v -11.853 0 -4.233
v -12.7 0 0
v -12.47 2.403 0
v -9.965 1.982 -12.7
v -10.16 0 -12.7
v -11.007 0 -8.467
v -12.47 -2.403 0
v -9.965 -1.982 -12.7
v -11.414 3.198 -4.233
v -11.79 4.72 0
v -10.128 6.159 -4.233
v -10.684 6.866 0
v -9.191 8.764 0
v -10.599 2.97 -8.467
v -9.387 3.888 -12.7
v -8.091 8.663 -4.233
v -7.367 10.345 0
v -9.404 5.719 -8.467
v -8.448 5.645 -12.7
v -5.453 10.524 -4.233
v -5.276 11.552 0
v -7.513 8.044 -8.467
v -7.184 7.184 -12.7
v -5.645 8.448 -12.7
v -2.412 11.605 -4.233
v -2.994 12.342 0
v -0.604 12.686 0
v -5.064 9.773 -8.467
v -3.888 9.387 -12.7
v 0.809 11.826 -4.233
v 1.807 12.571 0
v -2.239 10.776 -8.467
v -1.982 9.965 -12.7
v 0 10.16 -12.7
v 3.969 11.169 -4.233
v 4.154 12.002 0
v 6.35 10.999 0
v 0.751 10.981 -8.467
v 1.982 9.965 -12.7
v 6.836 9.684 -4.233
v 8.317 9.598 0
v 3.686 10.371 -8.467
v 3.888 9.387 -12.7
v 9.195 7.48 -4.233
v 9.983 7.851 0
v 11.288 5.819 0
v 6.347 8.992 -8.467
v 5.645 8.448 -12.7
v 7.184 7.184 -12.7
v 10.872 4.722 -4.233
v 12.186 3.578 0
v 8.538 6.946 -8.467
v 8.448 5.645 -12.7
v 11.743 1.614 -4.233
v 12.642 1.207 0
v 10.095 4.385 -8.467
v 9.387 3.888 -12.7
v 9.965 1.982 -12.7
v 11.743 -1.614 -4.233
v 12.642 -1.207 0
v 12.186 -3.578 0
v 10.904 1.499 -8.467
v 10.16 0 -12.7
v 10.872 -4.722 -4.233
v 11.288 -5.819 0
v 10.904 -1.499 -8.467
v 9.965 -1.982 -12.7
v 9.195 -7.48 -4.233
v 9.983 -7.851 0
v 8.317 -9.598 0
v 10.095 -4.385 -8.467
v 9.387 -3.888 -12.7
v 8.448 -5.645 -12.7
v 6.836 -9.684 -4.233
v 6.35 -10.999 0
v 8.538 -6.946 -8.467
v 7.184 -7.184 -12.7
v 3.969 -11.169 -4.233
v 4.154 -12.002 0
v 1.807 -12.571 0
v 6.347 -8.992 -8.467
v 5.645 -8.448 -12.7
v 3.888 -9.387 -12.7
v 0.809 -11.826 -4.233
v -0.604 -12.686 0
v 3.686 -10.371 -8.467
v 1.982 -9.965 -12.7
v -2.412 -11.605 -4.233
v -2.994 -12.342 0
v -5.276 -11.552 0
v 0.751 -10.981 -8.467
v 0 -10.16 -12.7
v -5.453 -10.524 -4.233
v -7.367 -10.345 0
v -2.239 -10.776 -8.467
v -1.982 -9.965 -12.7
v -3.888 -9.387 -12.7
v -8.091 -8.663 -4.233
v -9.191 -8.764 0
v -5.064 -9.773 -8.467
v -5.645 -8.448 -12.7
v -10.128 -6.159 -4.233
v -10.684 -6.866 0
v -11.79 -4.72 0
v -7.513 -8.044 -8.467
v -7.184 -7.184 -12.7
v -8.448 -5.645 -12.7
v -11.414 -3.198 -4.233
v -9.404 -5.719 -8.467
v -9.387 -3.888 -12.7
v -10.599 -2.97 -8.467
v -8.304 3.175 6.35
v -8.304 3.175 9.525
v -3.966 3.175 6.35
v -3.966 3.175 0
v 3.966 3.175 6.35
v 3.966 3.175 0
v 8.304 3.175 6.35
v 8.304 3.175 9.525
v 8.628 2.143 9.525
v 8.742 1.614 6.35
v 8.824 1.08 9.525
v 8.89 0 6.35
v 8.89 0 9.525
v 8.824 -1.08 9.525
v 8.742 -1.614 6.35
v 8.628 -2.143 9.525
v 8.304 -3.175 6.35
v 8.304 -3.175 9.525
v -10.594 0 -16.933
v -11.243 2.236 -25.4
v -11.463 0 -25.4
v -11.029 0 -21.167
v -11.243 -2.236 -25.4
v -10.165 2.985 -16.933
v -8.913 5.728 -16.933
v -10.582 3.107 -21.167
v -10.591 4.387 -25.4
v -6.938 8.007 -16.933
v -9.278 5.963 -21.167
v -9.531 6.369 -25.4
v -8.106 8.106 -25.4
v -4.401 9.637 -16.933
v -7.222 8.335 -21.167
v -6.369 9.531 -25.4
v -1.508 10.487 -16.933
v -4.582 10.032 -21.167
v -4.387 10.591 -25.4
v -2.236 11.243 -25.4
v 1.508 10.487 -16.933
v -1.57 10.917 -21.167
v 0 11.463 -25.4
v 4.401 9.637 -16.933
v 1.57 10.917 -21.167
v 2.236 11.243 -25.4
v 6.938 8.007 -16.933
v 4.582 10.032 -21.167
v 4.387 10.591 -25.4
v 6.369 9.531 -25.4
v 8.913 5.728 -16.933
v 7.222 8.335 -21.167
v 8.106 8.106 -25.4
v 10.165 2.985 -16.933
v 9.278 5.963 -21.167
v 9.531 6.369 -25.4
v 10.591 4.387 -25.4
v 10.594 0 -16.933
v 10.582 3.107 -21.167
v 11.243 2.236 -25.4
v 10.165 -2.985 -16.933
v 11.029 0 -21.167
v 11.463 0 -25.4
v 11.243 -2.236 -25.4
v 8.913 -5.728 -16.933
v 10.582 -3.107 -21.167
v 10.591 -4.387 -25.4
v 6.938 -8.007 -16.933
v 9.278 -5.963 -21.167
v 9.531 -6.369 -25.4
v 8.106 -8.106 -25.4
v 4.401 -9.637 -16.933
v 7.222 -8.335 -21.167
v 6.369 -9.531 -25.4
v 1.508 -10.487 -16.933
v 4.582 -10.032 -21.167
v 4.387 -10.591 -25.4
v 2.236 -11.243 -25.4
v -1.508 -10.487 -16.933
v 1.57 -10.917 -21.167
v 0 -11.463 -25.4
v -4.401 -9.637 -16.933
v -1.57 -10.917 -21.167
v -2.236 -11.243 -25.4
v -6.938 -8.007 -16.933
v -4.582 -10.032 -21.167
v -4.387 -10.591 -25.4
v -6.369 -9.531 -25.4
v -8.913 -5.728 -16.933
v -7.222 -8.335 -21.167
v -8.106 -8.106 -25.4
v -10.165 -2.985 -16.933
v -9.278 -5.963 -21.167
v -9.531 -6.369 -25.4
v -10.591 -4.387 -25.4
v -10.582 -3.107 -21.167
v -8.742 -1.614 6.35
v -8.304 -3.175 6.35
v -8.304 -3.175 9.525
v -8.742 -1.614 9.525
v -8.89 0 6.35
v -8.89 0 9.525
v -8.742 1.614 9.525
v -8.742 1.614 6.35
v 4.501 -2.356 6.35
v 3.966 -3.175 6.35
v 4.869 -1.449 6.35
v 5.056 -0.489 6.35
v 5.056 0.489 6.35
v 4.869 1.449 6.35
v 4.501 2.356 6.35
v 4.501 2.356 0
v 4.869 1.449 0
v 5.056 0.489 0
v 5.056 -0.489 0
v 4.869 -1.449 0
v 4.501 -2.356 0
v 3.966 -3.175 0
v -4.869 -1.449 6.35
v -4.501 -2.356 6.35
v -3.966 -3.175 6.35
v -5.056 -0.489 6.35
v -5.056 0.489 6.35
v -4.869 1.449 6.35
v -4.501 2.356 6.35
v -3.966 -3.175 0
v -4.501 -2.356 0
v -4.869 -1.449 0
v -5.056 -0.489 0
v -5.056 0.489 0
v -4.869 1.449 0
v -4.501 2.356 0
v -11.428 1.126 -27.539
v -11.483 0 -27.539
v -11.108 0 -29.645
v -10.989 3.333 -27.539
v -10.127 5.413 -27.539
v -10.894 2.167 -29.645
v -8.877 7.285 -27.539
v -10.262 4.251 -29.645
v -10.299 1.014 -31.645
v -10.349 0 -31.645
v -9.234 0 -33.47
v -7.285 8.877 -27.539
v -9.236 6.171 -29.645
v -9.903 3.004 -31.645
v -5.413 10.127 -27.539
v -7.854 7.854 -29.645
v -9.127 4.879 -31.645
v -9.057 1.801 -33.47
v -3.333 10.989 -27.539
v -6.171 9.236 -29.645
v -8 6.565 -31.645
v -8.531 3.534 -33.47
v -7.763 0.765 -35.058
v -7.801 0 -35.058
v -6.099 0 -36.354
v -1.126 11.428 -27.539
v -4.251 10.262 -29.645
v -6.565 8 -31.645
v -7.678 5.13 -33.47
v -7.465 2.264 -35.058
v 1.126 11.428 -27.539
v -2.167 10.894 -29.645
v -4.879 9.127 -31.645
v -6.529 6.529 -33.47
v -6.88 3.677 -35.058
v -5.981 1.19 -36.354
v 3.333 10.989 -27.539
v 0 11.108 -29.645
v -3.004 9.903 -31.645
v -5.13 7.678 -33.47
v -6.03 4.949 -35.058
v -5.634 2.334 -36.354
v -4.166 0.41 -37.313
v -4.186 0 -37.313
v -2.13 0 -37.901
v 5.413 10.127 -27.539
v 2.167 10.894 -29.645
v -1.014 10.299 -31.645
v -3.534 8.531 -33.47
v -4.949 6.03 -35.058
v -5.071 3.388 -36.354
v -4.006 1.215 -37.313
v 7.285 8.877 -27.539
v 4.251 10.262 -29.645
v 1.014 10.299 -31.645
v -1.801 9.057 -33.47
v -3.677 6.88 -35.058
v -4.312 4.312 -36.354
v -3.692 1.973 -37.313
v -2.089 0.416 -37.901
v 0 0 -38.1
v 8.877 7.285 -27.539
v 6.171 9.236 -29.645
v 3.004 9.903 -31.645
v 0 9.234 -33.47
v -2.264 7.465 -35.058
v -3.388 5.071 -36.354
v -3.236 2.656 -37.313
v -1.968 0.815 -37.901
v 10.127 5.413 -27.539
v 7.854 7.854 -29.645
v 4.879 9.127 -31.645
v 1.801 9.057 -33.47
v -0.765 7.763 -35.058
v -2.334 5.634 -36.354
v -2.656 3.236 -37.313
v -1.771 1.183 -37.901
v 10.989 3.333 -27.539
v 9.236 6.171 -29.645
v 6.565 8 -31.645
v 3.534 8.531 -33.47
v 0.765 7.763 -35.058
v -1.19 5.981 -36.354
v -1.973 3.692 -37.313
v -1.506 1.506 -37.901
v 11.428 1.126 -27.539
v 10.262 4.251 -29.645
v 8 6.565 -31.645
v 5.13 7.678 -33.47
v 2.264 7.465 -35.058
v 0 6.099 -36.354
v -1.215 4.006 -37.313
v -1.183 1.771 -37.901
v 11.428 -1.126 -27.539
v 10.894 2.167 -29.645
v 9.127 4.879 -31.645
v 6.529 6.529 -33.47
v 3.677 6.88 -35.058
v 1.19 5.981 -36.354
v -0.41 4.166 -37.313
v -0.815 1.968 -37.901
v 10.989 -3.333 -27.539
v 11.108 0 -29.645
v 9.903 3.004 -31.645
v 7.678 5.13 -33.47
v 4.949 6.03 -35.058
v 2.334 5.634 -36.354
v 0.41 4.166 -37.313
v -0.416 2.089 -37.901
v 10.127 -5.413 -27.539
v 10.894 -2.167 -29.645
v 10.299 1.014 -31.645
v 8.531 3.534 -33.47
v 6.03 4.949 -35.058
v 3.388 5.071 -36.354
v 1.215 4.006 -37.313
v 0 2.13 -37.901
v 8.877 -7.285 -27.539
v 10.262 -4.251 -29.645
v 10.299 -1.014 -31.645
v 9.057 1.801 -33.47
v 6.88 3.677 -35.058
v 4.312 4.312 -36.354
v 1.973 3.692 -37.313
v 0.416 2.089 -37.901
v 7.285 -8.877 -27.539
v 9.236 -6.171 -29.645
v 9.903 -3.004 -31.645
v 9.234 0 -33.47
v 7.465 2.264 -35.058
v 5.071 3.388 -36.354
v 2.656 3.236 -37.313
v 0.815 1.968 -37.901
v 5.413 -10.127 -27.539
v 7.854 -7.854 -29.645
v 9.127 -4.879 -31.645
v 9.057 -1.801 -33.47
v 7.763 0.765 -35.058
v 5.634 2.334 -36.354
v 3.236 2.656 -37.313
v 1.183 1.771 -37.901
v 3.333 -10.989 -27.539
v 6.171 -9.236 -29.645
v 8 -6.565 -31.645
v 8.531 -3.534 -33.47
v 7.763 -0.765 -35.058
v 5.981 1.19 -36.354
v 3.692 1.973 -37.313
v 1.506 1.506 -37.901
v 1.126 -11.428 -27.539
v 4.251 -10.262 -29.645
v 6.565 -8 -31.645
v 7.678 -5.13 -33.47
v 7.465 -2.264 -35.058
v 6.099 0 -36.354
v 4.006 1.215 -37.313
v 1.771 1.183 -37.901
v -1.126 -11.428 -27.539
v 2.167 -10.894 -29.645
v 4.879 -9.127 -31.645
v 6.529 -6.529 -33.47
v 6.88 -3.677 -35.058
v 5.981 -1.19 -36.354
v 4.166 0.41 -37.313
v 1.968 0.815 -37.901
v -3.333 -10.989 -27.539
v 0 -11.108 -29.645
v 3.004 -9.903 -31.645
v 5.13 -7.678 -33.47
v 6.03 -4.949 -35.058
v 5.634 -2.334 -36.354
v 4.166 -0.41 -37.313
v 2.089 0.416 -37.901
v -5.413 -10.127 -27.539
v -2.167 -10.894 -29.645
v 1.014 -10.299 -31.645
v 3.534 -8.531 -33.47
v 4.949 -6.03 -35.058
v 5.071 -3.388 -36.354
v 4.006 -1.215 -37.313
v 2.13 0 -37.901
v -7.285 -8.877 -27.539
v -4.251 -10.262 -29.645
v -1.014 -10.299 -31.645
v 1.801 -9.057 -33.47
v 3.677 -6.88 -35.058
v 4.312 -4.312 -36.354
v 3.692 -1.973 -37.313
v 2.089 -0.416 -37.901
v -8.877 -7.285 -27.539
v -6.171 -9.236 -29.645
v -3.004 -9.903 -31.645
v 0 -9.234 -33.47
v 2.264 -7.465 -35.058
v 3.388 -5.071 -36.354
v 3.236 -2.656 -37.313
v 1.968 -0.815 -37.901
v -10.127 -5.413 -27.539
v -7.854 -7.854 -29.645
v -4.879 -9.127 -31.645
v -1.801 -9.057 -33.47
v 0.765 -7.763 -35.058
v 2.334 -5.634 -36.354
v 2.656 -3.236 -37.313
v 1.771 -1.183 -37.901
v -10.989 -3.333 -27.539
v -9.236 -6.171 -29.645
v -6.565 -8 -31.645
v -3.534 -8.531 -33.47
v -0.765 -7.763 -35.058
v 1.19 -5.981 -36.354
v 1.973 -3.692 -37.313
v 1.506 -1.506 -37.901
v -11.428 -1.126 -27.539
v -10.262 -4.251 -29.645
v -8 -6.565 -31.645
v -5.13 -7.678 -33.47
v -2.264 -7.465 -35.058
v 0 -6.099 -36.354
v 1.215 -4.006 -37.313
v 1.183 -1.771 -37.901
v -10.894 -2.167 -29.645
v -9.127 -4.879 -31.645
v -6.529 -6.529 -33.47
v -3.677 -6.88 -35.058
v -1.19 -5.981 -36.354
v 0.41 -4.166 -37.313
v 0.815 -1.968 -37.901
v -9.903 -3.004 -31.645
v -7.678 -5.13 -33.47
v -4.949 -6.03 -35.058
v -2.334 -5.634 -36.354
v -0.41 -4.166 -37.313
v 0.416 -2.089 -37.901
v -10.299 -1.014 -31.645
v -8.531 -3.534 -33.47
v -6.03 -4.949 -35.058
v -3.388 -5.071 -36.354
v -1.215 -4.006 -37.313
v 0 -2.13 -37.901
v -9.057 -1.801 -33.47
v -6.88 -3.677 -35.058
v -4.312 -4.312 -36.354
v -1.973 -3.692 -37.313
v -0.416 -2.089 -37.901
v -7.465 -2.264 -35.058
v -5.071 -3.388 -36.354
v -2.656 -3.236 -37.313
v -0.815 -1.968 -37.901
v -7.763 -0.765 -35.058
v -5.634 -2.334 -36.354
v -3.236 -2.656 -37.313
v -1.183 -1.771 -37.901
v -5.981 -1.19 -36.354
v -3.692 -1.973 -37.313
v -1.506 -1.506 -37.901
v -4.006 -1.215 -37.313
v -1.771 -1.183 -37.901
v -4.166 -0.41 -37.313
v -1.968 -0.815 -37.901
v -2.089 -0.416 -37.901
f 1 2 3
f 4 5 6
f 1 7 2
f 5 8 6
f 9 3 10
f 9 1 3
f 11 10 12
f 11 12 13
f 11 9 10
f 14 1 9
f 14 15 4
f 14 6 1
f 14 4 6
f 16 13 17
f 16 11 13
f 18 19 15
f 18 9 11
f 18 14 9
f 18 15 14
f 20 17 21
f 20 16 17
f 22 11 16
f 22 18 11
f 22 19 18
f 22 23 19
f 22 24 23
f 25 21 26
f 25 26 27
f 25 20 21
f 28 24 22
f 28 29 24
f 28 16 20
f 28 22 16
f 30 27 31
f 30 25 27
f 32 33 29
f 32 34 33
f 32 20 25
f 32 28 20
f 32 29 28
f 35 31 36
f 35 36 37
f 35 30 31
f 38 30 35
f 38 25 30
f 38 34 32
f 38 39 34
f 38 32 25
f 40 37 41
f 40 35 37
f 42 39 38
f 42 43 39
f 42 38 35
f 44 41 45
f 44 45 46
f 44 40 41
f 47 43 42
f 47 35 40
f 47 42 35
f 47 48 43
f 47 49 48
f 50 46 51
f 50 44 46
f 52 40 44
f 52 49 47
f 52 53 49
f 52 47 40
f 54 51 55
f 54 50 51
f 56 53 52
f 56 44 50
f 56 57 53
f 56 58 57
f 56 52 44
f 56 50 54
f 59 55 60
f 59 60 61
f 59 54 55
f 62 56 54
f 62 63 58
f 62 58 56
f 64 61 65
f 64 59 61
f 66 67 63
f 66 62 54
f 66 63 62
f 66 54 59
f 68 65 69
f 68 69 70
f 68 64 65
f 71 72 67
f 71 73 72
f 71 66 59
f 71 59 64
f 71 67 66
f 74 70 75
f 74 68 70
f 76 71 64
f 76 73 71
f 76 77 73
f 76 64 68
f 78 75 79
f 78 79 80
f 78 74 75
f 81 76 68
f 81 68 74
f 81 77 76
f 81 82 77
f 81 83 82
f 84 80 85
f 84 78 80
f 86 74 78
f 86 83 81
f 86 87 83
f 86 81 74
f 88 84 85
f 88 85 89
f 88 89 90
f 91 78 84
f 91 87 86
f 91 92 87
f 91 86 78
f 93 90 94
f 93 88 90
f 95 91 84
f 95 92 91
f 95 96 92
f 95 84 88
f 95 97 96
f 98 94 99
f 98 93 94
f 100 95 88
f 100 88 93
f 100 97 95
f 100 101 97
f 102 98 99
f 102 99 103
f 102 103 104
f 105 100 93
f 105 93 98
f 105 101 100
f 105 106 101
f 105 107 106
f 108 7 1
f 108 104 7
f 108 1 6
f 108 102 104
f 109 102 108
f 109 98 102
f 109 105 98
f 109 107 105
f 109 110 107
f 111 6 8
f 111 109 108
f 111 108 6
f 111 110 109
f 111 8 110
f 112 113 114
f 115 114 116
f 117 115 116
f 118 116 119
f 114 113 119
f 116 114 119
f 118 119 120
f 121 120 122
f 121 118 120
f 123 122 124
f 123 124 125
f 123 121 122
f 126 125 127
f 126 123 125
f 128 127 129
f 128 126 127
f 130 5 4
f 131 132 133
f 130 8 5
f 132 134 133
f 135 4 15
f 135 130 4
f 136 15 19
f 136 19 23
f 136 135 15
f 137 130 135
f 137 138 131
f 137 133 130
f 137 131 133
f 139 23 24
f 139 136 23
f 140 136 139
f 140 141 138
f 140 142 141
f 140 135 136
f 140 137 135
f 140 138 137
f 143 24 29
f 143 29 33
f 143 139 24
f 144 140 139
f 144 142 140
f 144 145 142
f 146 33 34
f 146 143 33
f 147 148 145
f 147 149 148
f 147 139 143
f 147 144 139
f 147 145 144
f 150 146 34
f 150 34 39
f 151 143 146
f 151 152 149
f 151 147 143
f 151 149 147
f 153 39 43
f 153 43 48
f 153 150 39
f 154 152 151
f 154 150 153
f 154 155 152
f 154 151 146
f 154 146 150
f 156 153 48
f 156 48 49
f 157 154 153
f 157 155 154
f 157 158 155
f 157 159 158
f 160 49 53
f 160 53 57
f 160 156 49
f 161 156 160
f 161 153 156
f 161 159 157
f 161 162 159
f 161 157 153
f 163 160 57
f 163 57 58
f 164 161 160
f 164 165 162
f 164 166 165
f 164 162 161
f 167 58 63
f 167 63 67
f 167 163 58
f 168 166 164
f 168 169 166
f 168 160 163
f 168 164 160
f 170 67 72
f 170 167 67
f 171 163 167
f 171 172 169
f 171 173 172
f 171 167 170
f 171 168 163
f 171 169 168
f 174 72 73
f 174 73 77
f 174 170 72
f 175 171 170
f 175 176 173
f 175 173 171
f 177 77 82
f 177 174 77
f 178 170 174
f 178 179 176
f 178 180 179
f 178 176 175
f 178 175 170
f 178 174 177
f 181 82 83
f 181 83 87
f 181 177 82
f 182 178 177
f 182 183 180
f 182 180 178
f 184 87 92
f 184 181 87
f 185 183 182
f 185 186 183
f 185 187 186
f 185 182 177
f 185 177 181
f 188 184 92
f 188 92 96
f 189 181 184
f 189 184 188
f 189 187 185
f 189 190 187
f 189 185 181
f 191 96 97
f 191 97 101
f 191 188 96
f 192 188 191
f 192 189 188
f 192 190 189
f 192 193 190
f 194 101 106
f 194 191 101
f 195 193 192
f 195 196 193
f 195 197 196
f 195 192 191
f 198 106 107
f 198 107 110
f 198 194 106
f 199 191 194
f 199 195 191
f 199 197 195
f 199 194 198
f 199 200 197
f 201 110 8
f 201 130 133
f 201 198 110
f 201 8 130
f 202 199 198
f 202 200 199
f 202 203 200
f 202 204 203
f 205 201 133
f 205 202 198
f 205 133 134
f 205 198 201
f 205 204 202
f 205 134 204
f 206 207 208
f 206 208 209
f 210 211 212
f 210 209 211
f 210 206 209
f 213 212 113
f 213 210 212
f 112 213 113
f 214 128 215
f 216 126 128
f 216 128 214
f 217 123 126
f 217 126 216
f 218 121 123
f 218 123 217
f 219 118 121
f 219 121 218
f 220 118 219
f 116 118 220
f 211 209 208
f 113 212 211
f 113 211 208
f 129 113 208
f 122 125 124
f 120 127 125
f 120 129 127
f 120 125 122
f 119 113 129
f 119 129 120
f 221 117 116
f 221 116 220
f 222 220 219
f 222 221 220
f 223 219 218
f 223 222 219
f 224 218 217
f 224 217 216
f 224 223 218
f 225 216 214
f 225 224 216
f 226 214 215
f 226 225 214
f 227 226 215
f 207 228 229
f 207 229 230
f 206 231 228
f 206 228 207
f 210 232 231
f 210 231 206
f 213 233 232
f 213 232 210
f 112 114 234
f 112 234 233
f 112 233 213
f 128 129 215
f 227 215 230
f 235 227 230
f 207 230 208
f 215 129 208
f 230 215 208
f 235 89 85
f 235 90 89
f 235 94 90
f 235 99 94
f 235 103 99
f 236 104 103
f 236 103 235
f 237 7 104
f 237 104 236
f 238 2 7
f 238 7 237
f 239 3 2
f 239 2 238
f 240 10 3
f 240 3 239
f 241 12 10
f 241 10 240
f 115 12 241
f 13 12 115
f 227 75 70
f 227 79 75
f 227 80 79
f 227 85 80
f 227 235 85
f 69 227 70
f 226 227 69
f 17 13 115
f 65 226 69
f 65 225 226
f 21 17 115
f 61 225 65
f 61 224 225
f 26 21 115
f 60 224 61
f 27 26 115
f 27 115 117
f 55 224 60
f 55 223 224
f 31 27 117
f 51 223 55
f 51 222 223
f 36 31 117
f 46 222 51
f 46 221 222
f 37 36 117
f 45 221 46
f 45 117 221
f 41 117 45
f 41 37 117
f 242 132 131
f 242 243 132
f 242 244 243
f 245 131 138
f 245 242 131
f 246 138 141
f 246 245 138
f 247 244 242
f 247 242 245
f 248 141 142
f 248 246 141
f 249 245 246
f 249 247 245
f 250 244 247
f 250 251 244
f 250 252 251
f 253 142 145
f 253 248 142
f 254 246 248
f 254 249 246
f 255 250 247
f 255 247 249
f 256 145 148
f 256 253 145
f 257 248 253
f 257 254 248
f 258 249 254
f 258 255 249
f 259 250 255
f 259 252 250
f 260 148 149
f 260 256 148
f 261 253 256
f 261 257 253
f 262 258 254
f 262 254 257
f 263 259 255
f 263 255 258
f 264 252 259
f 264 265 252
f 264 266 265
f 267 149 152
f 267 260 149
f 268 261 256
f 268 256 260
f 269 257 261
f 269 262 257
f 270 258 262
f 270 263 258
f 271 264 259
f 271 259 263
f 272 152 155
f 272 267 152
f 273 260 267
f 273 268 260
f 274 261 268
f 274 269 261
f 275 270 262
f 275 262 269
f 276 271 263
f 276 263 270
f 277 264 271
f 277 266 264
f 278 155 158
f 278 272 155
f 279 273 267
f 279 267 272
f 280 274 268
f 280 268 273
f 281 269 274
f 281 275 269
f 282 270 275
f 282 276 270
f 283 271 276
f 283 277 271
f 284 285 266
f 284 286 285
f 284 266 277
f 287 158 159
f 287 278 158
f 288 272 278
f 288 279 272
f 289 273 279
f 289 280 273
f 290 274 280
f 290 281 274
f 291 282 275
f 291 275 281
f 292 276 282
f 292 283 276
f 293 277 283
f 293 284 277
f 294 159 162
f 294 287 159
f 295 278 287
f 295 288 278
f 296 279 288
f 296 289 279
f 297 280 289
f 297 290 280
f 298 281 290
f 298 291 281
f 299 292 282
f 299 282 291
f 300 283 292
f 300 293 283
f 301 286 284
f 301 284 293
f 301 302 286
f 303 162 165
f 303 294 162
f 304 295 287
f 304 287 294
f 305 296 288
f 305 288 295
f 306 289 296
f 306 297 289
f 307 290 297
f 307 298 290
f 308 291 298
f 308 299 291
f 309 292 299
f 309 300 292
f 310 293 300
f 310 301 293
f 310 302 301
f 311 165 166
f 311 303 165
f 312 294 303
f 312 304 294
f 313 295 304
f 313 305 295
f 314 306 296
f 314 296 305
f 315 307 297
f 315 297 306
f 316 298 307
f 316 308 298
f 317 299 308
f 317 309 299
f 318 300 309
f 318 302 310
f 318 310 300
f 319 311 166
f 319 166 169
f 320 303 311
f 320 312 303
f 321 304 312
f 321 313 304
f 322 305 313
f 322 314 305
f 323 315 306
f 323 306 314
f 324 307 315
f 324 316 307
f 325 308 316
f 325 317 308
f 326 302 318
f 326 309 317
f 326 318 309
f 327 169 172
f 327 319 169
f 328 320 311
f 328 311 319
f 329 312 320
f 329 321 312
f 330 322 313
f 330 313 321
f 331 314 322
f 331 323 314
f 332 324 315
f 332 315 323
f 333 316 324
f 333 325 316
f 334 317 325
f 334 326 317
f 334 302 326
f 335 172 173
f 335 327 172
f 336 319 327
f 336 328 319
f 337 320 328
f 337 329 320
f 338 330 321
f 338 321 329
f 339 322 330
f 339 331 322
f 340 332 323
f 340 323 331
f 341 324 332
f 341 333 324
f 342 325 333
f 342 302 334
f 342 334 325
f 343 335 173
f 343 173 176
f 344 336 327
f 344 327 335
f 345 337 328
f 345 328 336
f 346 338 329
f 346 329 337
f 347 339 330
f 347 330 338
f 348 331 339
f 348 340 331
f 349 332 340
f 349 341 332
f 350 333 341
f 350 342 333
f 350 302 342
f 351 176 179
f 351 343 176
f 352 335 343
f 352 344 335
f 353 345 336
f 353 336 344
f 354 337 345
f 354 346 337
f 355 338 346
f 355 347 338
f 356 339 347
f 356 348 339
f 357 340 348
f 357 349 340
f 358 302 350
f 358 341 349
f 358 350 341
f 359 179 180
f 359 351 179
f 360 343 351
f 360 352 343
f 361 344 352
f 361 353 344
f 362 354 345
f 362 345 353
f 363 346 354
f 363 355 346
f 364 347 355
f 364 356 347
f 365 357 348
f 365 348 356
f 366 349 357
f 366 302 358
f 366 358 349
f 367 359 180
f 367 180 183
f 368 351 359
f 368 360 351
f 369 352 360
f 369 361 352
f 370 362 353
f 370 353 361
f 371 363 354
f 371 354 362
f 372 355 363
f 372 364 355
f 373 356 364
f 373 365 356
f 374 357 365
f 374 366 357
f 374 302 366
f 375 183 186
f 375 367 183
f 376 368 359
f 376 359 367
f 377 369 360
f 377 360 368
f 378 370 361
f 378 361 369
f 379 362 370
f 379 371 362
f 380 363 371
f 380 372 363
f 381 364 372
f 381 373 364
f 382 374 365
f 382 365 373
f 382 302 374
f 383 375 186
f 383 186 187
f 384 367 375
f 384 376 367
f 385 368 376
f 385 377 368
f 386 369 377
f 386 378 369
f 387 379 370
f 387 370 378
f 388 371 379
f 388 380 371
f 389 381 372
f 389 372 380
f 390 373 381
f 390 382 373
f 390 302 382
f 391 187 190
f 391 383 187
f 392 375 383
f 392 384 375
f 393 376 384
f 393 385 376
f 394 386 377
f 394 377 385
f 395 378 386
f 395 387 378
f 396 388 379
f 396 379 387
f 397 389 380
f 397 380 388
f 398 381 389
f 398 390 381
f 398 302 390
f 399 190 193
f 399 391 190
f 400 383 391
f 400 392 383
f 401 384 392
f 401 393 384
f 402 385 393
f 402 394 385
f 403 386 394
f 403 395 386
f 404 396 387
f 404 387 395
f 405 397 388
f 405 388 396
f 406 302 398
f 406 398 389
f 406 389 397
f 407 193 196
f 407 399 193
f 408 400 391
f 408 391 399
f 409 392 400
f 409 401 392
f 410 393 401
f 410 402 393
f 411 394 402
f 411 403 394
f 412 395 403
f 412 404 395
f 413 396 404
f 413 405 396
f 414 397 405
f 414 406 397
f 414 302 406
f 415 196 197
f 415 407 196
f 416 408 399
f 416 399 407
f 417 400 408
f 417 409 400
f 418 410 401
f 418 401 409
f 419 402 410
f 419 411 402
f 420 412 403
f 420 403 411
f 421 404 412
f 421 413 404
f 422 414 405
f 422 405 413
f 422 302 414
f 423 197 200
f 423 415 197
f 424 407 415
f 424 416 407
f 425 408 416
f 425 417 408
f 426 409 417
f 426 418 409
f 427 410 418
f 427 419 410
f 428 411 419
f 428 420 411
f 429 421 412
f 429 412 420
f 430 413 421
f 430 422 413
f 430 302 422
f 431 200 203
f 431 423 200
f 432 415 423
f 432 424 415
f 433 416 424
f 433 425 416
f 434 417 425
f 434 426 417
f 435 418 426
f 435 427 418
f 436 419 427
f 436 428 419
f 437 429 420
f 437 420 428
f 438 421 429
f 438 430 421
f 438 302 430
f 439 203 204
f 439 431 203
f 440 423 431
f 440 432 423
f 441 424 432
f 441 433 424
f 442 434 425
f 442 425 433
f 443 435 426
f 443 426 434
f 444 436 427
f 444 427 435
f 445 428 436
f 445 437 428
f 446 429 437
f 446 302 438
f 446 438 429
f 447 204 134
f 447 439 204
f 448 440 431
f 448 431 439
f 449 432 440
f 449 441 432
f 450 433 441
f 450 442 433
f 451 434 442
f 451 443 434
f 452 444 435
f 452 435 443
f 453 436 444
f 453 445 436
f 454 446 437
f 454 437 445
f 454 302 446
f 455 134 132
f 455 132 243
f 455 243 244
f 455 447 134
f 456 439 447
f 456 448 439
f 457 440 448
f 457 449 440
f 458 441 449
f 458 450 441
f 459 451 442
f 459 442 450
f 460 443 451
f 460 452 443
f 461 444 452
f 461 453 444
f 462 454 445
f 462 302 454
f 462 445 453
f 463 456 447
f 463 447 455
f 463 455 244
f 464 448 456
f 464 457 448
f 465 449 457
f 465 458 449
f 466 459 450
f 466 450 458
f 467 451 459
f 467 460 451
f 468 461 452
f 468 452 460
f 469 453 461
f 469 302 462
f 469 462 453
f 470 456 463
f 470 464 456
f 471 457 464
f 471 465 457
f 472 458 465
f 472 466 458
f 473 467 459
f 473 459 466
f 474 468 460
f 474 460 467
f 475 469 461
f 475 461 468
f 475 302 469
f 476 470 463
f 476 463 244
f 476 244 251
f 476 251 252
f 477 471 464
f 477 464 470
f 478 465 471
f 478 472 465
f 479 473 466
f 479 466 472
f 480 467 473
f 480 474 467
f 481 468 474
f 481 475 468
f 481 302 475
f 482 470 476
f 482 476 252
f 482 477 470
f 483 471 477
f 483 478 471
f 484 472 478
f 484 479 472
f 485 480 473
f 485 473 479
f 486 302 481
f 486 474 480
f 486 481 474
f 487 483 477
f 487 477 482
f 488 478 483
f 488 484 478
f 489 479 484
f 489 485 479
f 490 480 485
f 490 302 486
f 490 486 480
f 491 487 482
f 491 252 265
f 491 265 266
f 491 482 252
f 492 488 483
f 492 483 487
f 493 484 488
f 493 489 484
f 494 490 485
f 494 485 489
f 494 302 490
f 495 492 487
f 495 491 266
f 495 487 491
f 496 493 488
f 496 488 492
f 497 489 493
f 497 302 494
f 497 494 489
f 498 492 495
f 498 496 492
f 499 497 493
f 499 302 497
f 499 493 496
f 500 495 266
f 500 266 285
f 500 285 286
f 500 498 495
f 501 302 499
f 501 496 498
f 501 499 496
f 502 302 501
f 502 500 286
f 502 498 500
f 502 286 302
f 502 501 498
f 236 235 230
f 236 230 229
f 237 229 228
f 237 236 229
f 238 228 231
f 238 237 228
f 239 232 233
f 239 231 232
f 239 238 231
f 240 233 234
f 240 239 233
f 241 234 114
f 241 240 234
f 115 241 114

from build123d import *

# Parameters (mm, degrees)
F3_DEPTH = 9.525


with BuildPart() as f1:
    # F0 (on Front) → F1 (revolve)
    with BuildSketch(Plane.XZ):
        Polygon((0, -12.7), (0, 0), (-5.08, 0), (-12.7, 0), (-10.16, -12.7), align=None)
        Polygon((-5.08, 0), (0, 0), (0, 9.525), (-8.89, 9.525), (-8.89, 6.35), (-5.08, 6.35), align=None)
        Polygon((0, -25.4), (0, -12.7), (-10.16, -12.7), (-11.4633519053, -25.4), align=None)
        with BuildLine():
            Line((0, -38.1), (0, -25.4))
            Line((0, -25.4), (-11.4633519053, -25.4))
            ThreePointArc((-11.4633519053, -25.4), (-8.5542158744, -34.2976982984), (0, -38.1))
        make_face()
    revolve(axis=Axis((0, 0, -19.05), (0, 0, -1)))

    # F2 (on face) → F3 (cut, through all)
    with BuildSketch(Plane.XY.offset(9.525)):
        with BuildLine():
            ThreePointArc((8.3037024874, 3.175), (0, 8.89), (-8.3037024874, 3.175))
            Line((-8.3037024874, 3.175), (8.3037024874, 3.175))
        make_face()
        with BuildLine():
            Line((8.3037024874, -3.175), (-8.3037024874, -3.175))
            ThreePointArc((-8.3037024874, -3.175), (0, -8.89), (8.3037024874, -3.175))
        make_face()
        with BuildLine():
            ThreePointArc((10.9695693512, 3.175), (0, 11.4198107144), (-10.9695693512, 3.175))
            Line((-10.9695693512, 3.175), (-8.3037024874, 3.175))
            ThreePointArc((-8.3037024874, 3.175), (0, 8.89), (8.3037024874, 3.175))
            Line((8.3037024874, 3.175), (10.9695693512, 3.175))
        make_face()
        with BuildLine():
            Line((-8.3037024874, -3.175), (-10.9695693512, -3.175))
            ThreePointArc((-10.9695693512, -3.175), (0, -11.4198107144), (10.9695693512, -3.175))
            Line((10.9695693512, -3.175), (8.3037024874, -3.175))
            ThreePointArc((8.3037024874, -3.175), (0, -8.89), (-8.3037024874, -3.175))
        make_face()
        with BuildLine():
            Line((-8.3037024874, 3.175), (-10.9695693512, 3.175))
            ThreePointArc((-10.9695693512, 3.175), (-11.4198107144, 0), (-10.9695693512, -3.175))
            Line((-10.9695693512, -3.175), (-8.3037024874, -3.175))
            ThreePointArc((-8.3037024874, -3.175), (-8.89, 0), (-8.3037024874, 3.175))
        make_face()
        with BuildLine():
            ThreePointArc((11.4198107144, 0), (11.3066901072, 1.6033825405), (10.9695693512, 3.175))
            Line((10.9695693512, 3.175), (8.3037024874, 3.175))
            ThreePointArc((8.3037024874, 3.175), (8.7421969525, 1.6143396307), (8.89, 0))
            ThreePointArc((8.89, 0), (8.7421969525, -1.6143396307), (8.3037024874, -3.175))
            Line((8.3037024874, -3.175), (10.9695693512, -3.175))
            ThreePointArc((10.9695693512, -3.175), (11.3066901072, -1.6033825405), (11.4198107144, 0))
        make_face()
    extrude(amount=-F3_DEPTH, mode=Mode.SUBTRACT)


solid = f1.part
